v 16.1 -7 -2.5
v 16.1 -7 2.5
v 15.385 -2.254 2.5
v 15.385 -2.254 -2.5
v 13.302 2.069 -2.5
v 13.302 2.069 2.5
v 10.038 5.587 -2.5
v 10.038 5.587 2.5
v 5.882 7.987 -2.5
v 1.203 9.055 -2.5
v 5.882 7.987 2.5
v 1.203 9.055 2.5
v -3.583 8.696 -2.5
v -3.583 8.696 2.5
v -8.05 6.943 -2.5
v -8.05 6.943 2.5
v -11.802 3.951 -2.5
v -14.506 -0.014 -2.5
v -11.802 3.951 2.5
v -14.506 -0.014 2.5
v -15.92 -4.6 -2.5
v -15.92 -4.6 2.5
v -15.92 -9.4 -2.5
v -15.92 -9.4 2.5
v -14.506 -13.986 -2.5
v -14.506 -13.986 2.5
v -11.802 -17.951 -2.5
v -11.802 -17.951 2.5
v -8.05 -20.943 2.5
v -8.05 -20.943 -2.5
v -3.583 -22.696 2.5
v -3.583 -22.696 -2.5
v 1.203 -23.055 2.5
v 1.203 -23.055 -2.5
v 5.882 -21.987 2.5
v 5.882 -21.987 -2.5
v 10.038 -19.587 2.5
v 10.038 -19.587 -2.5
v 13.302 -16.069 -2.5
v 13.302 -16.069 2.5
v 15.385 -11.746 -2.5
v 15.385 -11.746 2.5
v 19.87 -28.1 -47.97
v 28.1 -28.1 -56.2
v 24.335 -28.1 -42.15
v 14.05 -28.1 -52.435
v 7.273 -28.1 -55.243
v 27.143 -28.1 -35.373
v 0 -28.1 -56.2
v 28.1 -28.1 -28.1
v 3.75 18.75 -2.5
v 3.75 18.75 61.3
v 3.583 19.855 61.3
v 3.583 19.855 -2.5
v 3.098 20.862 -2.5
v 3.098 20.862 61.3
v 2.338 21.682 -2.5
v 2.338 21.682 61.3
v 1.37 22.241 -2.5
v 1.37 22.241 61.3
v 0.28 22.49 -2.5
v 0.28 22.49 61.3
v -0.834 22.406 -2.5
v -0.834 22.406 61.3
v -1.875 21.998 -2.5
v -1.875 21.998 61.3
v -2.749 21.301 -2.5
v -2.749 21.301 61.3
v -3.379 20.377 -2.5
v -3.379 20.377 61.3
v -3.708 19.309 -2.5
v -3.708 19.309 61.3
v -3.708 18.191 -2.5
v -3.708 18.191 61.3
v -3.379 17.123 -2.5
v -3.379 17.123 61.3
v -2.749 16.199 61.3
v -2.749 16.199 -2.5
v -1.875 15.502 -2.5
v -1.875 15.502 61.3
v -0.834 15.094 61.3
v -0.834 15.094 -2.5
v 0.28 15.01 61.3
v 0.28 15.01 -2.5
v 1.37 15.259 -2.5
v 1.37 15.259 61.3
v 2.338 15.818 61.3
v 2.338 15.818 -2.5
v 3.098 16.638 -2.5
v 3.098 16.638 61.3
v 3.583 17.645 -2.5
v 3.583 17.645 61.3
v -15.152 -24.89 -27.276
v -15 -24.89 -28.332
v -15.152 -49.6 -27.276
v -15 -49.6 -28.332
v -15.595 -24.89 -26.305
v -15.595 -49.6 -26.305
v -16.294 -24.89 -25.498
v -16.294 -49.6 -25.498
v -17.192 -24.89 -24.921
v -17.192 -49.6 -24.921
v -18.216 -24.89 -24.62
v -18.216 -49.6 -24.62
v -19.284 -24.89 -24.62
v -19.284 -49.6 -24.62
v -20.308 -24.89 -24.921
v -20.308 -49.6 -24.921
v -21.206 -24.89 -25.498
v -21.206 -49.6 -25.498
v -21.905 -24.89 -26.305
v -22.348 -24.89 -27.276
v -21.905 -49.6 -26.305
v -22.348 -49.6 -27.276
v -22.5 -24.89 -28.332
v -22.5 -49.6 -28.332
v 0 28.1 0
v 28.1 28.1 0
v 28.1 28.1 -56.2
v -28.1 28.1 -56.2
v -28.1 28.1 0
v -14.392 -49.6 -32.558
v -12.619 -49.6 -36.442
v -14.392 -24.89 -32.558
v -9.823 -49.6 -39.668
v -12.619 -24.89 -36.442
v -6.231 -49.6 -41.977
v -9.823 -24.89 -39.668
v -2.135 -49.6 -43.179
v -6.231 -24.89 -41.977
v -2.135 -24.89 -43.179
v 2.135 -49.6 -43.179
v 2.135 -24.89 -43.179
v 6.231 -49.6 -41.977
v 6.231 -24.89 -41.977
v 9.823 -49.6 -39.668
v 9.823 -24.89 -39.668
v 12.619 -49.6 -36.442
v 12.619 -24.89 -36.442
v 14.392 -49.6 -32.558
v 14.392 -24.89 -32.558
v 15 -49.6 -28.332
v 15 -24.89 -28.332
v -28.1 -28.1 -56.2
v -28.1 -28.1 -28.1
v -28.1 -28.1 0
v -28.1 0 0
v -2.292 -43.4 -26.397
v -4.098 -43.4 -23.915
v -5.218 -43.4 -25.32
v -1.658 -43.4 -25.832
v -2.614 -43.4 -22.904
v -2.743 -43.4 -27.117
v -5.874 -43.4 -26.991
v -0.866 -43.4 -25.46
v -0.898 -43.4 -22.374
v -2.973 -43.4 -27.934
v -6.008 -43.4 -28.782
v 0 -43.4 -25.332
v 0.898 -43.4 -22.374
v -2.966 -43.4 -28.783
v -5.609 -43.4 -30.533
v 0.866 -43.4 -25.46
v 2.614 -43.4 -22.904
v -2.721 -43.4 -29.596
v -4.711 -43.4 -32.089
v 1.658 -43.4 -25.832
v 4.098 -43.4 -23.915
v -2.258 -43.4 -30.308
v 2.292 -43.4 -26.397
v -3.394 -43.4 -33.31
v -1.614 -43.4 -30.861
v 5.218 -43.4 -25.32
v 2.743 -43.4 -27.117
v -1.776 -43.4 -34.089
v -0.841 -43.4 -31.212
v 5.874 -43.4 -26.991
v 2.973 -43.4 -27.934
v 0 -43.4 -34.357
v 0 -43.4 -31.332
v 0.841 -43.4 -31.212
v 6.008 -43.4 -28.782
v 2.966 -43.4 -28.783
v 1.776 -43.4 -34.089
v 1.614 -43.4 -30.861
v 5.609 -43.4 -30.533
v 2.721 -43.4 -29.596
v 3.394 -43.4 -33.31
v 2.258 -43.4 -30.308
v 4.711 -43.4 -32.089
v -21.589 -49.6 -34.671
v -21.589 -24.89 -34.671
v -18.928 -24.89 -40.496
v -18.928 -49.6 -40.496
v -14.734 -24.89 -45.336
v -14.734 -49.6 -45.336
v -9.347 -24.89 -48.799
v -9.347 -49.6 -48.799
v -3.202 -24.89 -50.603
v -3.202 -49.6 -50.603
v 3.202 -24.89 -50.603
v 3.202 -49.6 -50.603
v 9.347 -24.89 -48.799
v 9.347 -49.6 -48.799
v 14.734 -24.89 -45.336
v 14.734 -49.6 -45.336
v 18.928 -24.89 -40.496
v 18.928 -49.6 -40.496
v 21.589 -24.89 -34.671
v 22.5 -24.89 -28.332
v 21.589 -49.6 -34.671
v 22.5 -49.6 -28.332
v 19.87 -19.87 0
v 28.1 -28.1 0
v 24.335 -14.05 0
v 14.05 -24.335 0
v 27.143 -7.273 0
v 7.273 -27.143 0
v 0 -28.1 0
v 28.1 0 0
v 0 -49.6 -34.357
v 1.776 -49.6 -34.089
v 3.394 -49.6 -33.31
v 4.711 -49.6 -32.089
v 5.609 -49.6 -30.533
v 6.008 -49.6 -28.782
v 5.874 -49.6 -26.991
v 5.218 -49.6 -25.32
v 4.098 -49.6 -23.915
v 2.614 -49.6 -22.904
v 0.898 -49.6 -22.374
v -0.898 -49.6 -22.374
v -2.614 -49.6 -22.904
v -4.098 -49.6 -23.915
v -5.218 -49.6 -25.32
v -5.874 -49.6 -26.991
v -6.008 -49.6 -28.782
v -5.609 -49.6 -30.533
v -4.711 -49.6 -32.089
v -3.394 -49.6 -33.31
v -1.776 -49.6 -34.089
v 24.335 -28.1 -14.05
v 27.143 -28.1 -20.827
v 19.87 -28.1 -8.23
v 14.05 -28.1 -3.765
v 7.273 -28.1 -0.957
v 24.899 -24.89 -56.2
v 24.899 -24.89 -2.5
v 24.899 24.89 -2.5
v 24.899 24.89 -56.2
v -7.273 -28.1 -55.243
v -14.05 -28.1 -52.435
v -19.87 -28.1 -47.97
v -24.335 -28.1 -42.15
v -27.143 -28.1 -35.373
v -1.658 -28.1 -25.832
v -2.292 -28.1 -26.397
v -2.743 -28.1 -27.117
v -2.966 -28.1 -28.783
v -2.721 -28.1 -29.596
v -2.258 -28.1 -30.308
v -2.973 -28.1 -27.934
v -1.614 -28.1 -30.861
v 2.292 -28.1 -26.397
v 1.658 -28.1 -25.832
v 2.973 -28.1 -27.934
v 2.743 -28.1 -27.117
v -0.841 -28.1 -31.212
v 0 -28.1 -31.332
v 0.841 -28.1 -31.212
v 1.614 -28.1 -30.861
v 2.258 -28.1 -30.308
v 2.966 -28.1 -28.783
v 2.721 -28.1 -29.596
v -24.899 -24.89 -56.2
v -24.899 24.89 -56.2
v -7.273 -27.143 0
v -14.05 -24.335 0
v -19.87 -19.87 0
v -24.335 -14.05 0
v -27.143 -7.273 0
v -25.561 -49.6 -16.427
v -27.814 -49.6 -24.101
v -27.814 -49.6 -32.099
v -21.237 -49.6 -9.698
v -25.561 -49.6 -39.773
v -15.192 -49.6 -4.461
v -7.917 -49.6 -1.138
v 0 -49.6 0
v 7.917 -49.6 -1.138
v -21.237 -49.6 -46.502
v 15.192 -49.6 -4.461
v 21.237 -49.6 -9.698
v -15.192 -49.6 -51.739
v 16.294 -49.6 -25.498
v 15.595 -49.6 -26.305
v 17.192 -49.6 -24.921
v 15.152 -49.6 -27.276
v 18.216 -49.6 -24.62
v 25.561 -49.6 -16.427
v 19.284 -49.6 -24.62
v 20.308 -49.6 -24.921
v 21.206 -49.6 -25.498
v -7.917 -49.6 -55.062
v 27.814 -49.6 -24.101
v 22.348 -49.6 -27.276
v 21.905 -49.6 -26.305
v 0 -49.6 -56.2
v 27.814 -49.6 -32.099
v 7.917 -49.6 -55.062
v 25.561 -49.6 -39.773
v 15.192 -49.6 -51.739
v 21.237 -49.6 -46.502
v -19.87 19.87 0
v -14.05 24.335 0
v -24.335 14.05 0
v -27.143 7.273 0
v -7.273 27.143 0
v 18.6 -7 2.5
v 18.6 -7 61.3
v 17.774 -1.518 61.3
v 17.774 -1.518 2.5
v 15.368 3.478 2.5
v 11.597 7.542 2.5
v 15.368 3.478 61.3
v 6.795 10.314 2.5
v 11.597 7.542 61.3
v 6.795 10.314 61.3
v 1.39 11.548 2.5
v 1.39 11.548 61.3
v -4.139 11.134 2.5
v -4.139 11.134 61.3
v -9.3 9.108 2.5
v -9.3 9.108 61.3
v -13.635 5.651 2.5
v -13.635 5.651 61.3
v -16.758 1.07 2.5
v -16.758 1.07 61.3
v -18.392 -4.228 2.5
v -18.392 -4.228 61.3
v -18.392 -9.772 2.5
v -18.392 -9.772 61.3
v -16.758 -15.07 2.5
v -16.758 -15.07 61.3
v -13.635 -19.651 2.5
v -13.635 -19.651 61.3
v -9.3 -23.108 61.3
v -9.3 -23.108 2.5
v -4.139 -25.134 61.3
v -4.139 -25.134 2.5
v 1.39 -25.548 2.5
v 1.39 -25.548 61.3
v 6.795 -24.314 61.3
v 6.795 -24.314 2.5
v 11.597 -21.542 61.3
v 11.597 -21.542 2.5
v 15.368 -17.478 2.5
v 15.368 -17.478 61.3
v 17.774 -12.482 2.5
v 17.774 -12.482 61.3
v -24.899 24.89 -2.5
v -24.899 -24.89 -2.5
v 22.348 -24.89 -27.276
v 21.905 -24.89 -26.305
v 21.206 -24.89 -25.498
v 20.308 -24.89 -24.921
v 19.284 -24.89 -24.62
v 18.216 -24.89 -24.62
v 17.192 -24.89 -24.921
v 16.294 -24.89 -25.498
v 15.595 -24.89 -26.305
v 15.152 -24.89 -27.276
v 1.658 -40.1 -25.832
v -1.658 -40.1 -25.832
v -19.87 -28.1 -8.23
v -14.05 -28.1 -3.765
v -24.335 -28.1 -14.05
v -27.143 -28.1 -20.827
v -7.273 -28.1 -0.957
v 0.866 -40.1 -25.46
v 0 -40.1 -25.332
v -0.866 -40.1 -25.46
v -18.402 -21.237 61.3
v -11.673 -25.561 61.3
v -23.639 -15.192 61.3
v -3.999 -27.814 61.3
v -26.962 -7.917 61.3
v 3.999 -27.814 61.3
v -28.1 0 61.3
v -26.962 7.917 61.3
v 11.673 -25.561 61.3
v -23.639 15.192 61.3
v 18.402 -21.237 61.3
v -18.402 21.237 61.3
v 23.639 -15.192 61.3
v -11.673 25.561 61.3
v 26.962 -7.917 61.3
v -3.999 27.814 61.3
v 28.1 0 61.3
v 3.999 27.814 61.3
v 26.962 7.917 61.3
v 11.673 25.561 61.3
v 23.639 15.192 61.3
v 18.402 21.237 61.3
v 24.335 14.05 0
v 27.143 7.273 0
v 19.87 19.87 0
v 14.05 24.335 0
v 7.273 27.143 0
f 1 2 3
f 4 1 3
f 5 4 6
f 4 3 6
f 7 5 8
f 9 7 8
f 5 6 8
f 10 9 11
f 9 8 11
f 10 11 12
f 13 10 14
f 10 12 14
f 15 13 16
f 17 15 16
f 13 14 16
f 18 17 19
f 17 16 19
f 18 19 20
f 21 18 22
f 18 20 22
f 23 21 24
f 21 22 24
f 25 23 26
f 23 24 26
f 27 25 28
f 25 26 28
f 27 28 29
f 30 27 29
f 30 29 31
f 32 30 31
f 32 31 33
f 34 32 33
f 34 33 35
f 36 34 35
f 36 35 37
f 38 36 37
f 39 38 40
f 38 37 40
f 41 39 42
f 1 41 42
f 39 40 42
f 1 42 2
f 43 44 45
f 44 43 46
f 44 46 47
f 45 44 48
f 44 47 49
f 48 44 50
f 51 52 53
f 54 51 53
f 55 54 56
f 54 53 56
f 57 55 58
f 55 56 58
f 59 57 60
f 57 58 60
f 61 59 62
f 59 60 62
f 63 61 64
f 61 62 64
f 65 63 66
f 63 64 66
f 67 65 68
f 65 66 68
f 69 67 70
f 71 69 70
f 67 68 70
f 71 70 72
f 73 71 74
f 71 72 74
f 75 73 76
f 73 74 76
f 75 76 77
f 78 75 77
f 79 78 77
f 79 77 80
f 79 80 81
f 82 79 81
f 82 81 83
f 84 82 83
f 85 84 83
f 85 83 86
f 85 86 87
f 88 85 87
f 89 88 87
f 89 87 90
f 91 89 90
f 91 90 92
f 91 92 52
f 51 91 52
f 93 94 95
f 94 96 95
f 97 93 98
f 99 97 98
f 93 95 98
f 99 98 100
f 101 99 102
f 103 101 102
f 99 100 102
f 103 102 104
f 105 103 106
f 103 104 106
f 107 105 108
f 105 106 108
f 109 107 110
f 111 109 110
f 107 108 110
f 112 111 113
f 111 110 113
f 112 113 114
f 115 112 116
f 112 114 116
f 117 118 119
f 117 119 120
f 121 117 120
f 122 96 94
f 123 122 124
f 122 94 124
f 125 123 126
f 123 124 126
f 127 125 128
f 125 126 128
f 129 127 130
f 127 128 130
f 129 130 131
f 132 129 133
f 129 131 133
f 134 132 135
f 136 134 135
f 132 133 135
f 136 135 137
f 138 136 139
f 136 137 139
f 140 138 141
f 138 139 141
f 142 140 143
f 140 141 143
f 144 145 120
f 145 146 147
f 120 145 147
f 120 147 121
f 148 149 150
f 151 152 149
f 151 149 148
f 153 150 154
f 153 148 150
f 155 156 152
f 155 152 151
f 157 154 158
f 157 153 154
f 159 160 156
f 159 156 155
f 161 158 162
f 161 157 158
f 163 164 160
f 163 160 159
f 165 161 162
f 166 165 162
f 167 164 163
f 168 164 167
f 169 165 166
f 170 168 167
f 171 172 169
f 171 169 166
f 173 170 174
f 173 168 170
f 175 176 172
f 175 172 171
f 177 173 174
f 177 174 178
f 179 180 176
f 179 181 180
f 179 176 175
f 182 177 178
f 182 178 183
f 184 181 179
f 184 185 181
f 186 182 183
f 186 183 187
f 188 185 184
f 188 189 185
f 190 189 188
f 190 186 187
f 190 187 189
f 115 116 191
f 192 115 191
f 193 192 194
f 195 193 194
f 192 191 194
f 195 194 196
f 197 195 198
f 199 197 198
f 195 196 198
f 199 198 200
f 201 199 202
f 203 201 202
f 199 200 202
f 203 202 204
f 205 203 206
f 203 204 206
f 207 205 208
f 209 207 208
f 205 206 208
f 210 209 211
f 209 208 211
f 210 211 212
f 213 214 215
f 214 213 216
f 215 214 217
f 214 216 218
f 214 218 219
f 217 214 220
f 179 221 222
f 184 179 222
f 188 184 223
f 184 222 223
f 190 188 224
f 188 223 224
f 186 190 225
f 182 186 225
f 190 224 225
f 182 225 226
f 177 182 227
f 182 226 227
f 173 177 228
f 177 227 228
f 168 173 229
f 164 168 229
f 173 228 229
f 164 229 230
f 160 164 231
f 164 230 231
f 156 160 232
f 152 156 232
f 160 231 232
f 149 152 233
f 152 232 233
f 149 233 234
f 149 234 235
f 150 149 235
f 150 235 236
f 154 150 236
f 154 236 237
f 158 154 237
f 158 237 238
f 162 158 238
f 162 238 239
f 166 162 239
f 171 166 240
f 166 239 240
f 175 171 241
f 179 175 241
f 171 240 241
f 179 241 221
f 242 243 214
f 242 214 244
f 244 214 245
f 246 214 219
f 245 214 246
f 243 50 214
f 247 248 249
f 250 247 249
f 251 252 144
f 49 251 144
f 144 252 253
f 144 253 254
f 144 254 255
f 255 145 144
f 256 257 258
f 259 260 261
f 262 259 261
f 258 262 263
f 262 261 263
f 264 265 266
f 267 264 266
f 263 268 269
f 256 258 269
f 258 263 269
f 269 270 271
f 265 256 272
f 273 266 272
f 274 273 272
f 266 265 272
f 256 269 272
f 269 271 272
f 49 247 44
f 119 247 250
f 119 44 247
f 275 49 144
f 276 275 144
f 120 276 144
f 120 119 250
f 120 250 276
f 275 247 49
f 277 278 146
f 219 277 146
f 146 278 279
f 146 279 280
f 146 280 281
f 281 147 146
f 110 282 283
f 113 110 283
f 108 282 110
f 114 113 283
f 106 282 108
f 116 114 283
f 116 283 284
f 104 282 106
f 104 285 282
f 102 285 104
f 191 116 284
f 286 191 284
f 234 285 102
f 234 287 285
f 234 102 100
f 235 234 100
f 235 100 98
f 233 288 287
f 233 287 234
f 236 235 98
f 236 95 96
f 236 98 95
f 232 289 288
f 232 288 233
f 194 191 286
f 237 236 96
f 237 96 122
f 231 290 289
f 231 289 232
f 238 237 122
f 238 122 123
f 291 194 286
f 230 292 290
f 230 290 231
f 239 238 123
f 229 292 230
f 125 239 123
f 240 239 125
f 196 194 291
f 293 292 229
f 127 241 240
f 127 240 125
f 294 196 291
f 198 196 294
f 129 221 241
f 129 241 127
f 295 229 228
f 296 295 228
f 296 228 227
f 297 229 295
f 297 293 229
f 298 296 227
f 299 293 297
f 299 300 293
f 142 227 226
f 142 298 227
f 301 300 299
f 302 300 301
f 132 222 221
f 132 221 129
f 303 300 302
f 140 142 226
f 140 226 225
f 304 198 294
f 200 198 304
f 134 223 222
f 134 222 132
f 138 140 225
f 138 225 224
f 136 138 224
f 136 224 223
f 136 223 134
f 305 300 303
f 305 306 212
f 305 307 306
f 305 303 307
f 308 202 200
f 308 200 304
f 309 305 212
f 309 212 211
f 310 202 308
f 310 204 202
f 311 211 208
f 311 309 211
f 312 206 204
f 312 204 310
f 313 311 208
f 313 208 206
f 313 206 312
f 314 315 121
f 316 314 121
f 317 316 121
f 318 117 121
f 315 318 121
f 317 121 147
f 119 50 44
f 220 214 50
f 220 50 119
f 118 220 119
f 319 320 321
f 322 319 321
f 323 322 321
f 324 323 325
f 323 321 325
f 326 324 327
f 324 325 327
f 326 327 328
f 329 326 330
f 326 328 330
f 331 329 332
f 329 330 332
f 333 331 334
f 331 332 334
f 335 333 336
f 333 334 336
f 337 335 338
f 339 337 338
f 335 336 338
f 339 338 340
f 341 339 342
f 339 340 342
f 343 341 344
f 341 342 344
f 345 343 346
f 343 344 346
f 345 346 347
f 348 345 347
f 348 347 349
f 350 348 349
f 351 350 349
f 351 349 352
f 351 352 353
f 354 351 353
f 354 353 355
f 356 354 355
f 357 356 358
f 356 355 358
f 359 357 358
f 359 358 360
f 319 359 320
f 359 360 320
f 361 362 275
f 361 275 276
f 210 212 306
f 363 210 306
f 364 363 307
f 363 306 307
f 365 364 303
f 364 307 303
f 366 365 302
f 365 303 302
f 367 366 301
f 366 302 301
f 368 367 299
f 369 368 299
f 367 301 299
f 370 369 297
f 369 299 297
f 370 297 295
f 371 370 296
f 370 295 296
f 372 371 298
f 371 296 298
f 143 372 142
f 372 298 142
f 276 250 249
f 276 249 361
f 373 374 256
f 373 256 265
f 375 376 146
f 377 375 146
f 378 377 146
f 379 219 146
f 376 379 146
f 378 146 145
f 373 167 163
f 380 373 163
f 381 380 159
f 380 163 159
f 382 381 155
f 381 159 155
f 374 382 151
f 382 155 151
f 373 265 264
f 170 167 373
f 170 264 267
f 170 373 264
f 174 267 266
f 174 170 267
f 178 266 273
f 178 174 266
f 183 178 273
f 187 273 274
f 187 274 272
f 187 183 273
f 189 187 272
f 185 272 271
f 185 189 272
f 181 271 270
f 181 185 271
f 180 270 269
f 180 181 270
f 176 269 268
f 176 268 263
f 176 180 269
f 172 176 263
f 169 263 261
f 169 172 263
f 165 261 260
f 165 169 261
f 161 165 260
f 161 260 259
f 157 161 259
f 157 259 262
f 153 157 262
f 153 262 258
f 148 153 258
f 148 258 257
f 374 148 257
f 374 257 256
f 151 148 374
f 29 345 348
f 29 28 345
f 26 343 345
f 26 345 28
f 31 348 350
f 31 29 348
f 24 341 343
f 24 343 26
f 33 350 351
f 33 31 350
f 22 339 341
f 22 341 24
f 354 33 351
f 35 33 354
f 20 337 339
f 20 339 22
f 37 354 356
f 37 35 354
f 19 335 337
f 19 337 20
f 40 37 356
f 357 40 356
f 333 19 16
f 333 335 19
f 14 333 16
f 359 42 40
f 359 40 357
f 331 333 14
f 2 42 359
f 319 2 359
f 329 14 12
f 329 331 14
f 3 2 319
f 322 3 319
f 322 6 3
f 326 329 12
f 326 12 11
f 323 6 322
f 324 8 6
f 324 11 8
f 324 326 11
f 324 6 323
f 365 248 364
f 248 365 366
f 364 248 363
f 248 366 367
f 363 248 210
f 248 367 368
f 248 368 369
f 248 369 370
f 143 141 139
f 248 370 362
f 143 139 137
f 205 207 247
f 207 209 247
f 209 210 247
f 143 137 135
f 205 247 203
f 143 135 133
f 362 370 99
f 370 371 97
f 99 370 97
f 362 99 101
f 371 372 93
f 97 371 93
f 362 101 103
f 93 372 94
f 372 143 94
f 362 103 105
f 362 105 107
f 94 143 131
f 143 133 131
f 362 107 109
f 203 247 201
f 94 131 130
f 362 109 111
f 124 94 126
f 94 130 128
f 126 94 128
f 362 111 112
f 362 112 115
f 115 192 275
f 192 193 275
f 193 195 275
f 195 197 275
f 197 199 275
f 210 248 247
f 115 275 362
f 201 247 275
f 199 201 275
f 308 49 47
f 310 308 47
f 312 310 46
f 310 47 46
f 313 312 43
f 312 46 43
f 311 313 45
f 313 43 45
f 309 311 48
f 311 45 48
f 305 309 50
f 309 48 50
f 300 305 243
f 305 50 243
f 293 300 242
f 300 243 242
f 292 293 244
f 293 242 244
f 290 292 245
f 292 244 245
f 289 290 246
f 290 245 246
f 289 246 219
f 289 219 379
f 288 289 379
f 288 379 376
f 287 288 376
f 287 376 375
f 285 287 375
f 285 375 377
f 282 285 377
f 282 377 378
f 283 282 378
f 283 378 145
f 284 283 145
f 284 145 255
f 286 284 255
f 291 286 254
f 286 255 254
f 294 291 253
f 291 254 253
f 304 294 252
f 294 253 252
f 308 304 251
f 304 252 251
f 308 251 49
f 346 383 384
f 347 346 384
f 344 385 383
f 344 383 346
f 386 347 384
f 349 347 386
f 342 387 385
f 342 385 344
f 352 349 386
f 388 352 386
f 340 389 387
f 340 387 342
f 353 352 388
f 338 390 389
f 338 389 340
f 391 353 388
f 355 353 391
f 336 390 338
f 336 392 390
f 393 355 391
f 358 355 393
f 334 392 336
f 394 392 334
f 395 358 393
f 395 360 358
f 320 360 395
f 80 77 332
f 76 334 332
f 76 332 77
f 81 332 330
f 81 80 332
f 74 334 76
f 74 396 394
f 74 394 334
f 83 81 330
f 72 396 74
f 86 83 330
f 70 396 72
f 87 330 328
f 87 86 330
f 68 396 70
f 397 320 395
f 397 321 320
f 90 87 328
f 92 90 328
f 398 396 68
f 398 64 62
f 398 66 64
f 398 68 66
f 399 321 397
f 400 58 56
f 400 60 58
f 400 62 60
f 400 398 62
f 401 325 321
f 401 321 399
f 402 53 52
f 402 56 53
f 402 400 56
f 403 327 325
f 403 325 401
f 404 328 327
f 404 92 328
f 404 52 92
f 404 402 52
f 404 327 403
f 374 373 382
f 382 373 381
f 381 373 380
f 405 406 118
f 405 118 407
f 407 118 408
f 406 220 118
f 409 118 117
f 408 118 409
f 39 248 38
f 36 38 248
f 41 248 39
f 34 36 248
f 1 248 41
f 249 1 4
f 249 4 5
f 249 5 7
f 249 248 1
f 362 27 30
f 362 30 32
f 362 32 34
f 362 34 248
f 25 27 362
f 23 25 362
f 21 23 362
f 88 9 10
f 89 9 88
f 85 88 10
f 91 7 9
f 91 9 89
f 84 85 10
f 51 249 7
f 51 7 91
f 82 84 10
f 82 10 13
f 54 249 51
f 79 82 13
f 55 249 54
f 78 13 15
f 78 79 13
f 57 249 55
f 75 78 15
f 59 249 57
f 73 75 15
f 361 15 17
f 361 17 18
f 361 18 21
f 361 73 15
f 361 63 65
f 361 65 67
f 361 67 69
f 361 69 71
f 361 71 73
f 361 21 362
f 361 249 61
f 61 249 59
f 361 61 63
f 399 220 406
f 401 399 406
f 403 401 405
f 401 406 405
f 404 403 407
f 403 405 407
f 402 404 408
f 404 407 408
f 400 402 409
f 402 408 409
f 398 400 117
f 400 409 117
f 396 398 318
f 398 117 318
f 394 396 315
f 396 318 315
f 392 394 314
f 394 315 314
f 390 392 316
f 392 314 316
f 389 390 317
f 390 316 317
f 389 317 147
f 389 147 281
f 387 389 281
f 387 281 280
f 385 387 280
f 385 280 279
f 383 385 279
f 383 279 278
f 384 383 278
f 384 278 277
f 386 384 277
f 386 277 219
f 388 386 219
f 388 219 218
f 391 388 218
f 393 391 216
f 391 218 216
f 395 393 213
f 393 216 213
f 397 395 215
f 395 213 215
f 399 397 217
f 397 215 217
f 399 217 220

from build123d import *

# Parameters (mm, degrees)
SKETCH1_R           = 28.1
BOSS_EXTRUDE2_DEPTH = 61.3
SKETCH3_R           = 18.6
CUT_EXTRUDE2_DEPTH  = 58.8
SKETCH4_W           = 56.2
SKETCH4_H           = 56.2
BOSS_EXTRUDE3_DEPTH = 56.2
SKETCH5_R           = 16.1
CUT_EXTRUDE4_DEPTH  = 5
SKETCH6_W           = 49.797391422
SKETCH6_H           = 49.779255452
CUT_EXTRUDE5_DEPTH  = 53.7
SKETCH7_R           = 28.1
BOSS_EXTRUDE4_DEPTH = 21.5
CUT_EXTRUDE6_DEPTH  = 21.5
SKETCH9_R           = 3
CUT_EXTRUDE7_DEPTH  = 9.5
SKETCH10_R          = 6.025
CUT_EXTRUDE8_DEPTH  = 6.2
SKETCH18_R          = 3.75
CUT_EXTRUDE9_DEPTH  = 100
SKETCH19_R          = 3.75
CUT_EXTRUDE11_DEPTH = 25


with BuildPart() as part:
    # Sketch1 → Boss-Extrude2 (new body)
    with BuildSketch(Plane.XY):
        Circle(SKETCH1_R)
    extrude(amount=BOSS_EXTRUDE2_DEPTH)

    # Sketch3 → Cut-Extrude2 (cut)
    with BuildSketch(Plane.XY.offset(61.3)):
        with Locations((0, -7)):
            Circle(SKETCH3_R)
    extrude(amount=-CUT_EXTRUDE2_DEPTH, mode=Mode.SUBTRACT)

    # Sketch4 → Boss-Extrude3 (add)
    with BuildSketch(Plane(origin=(0, 0, 0), x_dir=(-1, 0, 0), z_dir=(0, 0, -1))):
        Rectangle(SKETCH4_W, SKETCH4_H)
    extrude(amount=BOSS_EXTRUDE3_DEPTH)

    # Sketch5 → Cut-Extrude4 (cut)
    with BuildSketch(Plane.XY.offset(2.5)):
        with Locations((0, -7)):
            Circle(SKETCH5_R)
    extrude(amount=-CUT_EXTRUDE4_DEPTH, mode=Mode.SUBTRACT)

    # Sketch6 → Cut-Extrude5 (cut)
    with BuildSketch(Plane(origin=(0, 0, -56.2), x_dir=(-1, 0, 0), z_dir=(0, 0, -1))):
        Rectangle(SKETCH6_W, SKETCH6_H)
    extrude(amount=-CUT_EXTRUDE5_DEPTH, mode=Mode.SUBTRACT)

    # Sketch7 → Boss-Extrude4 (add)
    with BuildSketch(Plane(origin=(0, -28.1, 0), x_dir=(-1, 0, 0), z_dir=(0, -1, 0))):
        with Locations(Location((0, 28.1, 0), (0, 0, 90))):
            Circle(SKETCH7_R)
    extrude(amount=BOSS_EXTRUDE4_DEPTH)

    # Sketch8 → Cut-Extrude6 (cut)
    with BuildSketch(Plane(origin=(0, -49.6, 0), x_dir=(-1, 0, 0), z_dir=(0, -1, 0))):
        with BuildLine():
            Line((1.658312395, 25.832078896), (-1.658312395, 25.832078896))
            ThreePointArc((-1.658312395, 25.832078896), (0, 31.332078896), (1.658312395, 25.832078896))
        make_face()
    extrude(amount=-CUT_EXTRUDE6_DEPTH, mode=Mode.SUBTRACT)

    # Sketch9 → Cut-Extrude7 (cut)
    with BuildSketch(Plane(origin=(0, -49.6, 0), x_dir=(-1, 0, 0), z_dir=(0, -1, 0))):
        with Locations(Location((0, 28.332078896, 0), (0, 0, 90))):
            Circle(SKETCH9_R)
    extrude(amount=-CUT_EXTRUDE7_DEPTH, mode=Mode.SUBTRACT)

    # Sketch10 → Cut-Extrude8 (cut)
    with BuildSketch(Plane(origin=(0, -49.6, 0), x_dir=(-1, 0, 0), z_dir=(0, -1, 0))):
        with Locations(Location((0, 28.332078896, 0), (0, 0, 90))):
            Circle(SKETCH10_R)
    extrude(amount=-CUT_EXTRUDE8_DEPTH, mode=Mode.SUBTRACT)

    # Cut-Sweep4: sweep along a path in Sketch15
    with BuildLine(Plane(origin=(0, -49.6, 0), x_dir=(-1, 0, 0), z_dir=(0, -1, 0))) as cut_sweep4_path:
        ThreePointArc((15, 28.332078896), (0, 43.332078896), (-15, 28.332078896))
    # 3DSketch2 → Cut-Sweep4 (sweep, cut)
    with BuildSketch(Plane(origin=(-15, -49.6, -28.332078896), x_dir=(-0.24561664909913958, 0.9693670417779378, 0), z_dir=(0, 0, 1))):
        Polygon((0, 0), (1.842124868, 7.270252813), (30.535389305, 0), (28.693264437, -7.270252813), align=None)
    sweep(path=cut_sweep4_path.line, mode=Mode.SUBTRACT)

    # Sketch18 → Cut-Extrude9 (cut)
    with BuildSketch(Plane.XY.offset(61.3)):
        with Locations((0, 18.75)):
            Circle(SKETCH18_R)
    extrude(amount=-CUT_EXTRUDE9_DEPTH, mode=Mode.SUBTRACT)

    # Sketch19 → Cut-Extrude11 (cut)
    with BuildSketch(Plane(origin=(0, -49.6, 0), x_dir=(-1, 0, 0), z_dir=(0, -1, 0))):
        with Locations((-18.75, 28.332078896)):
            Circle(SKETCH19_R)
        with Locations((18.75, 28.332078896)):
            Circle(SKETCH19_R)
    extrude(amount=-CUT_EXTRUDE11_DEPTH, mode=Mode.SUBTRACT)


solid = part.part
